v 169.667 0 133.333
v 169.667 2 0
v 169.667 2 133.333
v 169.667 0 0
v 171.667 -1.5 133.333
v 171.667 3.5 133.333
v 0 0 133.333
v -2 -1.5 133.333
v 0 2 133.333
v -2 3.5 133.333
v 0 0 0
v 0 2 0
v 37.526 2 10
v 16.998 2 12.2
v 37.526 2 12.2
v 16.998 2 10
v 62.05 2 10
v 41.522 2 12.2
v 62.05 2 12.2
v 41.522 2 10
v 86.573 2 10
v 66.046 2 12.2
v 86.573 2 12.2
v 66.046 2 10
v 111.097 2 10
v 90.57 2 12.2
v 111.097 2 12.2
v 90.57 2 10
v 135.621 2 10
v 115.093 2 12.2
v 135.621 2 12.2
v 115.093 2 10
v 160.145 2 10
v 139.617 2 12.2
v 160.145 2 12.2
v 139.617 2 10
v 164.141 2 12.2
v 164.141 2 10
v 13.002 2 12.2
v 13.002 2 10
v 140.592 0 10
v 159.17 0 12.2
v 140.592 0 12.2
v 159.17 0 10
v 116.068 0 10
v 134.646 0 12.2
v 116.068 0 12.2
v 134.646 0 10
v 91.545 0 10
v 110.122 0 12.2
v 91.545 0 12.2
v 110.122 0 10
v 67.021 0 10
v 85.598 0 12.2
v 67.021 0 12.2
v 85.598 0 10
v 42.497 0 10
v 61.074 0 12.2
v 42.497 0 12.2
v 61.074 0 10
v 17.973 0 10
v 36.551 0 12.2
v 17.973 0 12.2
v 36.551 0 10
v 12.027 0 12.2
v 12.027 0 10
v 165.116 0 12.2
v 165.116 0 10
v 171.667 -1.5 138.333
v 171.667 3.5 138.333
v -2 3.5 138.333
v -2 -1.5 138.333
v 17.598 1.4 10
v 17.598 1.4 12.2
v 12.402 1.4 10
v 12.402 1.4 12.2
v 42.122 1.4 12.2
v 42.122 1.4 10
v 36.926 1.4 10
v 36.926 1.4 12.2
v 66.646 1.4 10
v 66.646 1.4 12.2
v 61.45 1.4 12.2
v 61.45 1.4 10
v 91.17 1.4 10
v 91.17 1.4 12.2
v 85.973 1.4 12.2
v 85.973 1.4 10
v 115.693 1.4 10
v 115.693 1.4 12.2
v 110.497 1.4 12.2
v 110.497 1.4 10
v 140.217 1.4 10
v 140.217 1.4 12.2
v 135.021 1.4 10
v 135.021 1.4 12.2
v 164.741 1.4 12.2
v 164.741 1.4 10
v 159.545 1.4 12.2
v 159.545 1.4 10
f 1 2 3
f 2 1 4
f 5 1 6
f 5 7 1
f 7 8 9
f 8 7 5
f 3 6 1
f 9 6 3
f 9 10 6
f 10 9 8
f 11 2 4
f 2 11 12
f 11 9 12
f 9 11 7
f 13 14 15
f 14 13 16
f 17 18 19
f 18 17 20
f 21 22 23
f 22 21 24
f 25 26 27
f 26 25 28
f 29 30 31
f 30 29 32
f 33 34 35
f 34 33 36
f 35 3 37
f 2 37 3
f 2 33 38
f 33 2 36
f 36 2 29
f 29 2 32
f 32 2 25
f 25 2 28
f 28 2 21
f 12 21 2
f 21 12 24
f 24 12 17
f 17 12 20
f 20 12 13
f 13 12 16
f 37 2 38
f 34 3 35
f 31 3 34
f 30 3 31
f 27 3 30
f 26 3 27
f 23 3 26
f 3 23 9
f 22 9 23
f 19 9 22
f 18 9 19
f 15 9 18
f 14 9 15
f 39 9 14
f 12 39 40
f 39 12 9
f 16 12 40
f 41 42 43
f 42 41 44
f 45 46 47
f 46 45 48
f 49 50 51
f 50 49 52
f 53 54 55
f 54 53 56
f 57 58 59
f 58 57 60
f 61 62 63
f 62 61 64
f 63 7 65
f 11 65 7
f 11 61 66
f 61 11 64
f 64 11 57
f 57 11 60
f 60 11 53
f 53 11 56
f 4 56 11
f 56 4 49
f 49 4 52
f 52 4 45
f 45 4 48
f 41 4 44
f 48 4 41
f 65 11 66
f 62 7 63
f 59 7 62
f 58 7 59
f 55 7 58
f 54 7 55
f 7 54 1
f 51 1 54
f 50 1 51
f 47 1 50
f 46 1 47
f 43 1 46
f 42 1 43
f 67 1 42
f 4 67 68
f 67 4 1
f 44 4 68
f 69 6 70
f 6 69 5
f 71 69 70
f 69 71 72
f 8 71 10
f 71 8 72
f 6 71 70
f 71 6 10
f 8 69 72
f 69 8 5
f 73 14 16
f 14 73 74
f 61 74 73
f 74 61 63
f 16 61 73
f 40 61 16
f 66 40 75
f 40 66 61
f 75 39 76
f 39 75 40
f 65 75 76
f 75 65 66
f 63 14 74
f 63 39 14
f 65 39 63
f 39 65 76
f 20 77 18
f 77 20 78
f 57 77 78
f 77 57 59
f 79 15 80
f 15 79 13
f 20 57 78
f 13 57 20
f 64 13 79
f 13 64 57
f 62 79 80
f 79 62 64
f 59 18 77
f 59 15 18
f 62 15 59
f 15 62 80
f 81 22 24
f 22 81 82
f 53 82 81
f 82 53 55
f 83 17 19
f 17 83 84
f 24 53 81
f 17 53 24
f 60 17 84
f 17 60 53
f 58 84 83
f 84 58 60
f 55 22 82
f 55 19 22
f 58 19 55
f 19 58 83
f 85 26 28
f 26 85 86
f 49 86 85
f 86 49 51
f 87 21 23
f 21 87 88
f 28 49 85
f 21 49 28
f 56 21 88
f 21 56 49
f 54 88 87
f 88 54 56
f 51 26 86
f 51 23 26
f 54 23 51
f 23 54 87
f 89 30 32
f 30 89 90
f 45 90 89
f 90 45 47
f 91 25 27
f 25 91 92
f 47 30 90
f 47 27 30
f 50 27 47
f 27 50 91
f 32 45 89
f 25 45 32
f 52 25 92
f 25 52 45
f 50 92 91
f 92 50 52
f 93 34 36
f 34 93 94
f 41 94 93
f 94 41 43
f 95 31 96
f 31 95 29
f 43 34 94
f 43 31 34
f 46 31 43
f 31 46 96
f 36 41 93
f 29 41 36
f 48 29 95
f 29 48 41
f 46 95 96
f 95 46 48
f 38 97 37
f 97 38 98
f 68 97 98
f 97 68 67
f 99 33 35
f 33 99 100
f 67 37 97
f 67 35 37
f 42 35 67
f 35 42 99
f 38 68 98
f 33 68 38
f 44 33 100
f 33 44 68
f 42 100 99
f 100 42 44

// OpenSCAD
// file: goodsort-bin-prototype.scad
// ══════════════════════════════════════════════════════════════
// The Good Sort — 1:3 Scale 240L Yellow Bin + Sliding Divider
// ══════════════════════════════════════════════════════════════
// Print at 1:3 scale on Snapmaker U1 (270×270×270mm bed)
// All dimensions in mm (real-world in comments, model = real/3)
//
// Components (print separately):
//   1. bin_shell()        — the yellow bin body
//   2. rail_pair_width()  — 2 rail tracks for the width-axis divider
//   3. rail_pair_depth()  — 2 rail tracks for the depth-axis divider
//   4. divider_width()    — sliding wall (width direction)
//   5. divider_depth()    — sliding wall (depth direction)
//   6. centre_post()      — locking intersection post
//
// To render one part: uncomment it at the bottom of the file

// ── Parameters (real-world mm, divided by scale) ──────────────
scale       = 1/3;

// SULO 240L internal dimensions (real)
real_width  = 560;    // side to side
real_depth  = 640;    // front to back
real_height = 580;    // internal depth
real_taper  = 30;     // each side narrows by this at the bottom

// Model dimensions
w  = real_width  * scale;  // ~187mm
d  = real_depth  * scale;  // ~213mm
h  = real_height * scale;  // ~193mm
tp = real_taper  * scale;  // ~10mm taper per side

// Wall thicknesses
bin_wall    = 2.5;    // bin shell wall
div_thick   = 2.0;    // divider wall thickness
rail_h      = 4.0;    // rail track height
rail_slot   = 2.4;    // slot width in rail (divider slides through)
notch_space = 50 * scale; // ~17mm between notch detents
notch_depth = 0.6;    // how deep the click notch is
notch_width = 2.0;    // notch width along rail

// Divider height (shorter than bin so items can slide out when tipped)
div_height  = 400 * scale; // ~133mm (leaves ~60mm clearance at bottom)

// Centre post
post_size   = 8;      // square cross-section of centre locking post


// ── Modules ───────────────────────────────────────────────────

// Tapered bin shell (open top, no bottom for easy printing)
module bin_shell() {
    difference() {
        // Outer shell — tapered box
        hull() {
            // Top (wider)
            translate([0, 0, h])
                cube([w + bin_wall*2, d + bin_wall*2, 0.01], center=true);
            // Bottom (narrower due to taper)
            translate([0, 0, 0])
                cube([w + bin_wall*2 - tp*2, d + bin_wall*2 - tp*2, 0.01], center=true);
        }
        // Inner cavity
        hull() {
            translate([0, 0, h + 0.1])
                cube([w, d, 0.01], center=true);
            translate([0, 0, bin_wall])
                cube([w - tp*2, d - tp*2, 0.01], center=true);
        }
    }
}

// Rail track — clips to inner bin wall, has a slot for the divider to slide through
module rail_track(length, with_notches=true) {
    difference() {
        // Rail body
        cube([length, rail_h, rail_h]);
        // Slot for divider
        translate([-0.1, (rail_h - rail_slot)/2, rail_h * 0.3])
            cube([length + 0.2, rail_slot, rail_h]);
    }
    // Notch detents inside the slot
    if (with_notches) {
        for (i = [1 : floor(length / notch_space) - 1]) {
            translate([i * notch_space - notch_width/2, (rail_h - rail_slot)/2 - notch_depth, rail_h * 0.3])
                cube([notch_width, notch_depth + 0.1, rail_h * 0.5]);
            translate([i * notch_space - notch_width/2, (rail_h + rail_slot)/2, rail_h * 0.3])
                cube([notch_width, notch_depth + 0.1, rail_h * 0.5]);
        }
    }
}

// Rail pair for width-axis divider (these mount on front + back inner walls)
module rail_pair_width() {
    // Front rail
    rail_track(w - tp*1.5);
    // Back rail (offset for visual clarity when printing)
    translate([0, rail_h + 5, 0])
        rail_track(w - tp*1.5);
}

// Rail pair for depth-axis divider (mount on left + right inner walls)
module rail_pair_depth() {
    rail_track(d - tp*1.5);
    translate([0, rail_h + 5, 0])
        rail_track(d - tp*1.5);
}

// Sliding divider wall (width direction — slides left/right)
module divider_width() {
    // Main wall panel
    cube([d - tp*1.5 - 2, div_thick, div_height]);

    // Top grip/label strip (wider for grabbing + label area)
    translate([-2, -1.5, div_height])
        cube([d - tp*1.5 + 2, div_thick + 3, 5]);

    // Centre slot (cut from top, half height) for interlocking with depth divider
    // This will be done as a difference in the assembly
}

// Sliding divider wall (depth direction — slides front/back)
module divider_depth() {
    cube([w - tp*1.5 - 2, div_thick, div_height]);

    // Top grip/label strip
    translate([-2, -1.5, div_height])
        cube([w - tp*1.5 + 2, div_thick + 3, 5]);
}

// Centre post — locks the two dividers at their intersection
module centre_post() {
    difference() {
        cube([post_size, post_size, div_height * 0.8]);
        // Cross slots for the two divider walls
        translate([-0.1, (post_size - div_thick)/2 - 0.1, -0.1])
            cube([post_size + 0.2, div_thick + 0.2, div_height + 0.2]);
        translate([(post_size - div_thick)/2 - 0.1, -0.1, -0.1])
            cube([div_thick + 0.2, post_size + 0.2, div_height + 0.2]);
    }
}

// ── Drain holes for divider walls ─────────────────────────────
module divider_width_with_drains() {
    difference() {
        divider_width();
        // Drain holes along bottom edge
        for (i = [0 : 8]) {
            translate([15 + i * ((d - tp*1.5) / 9), -0.1, 10])
                cylinder(h = div_thick + 0.2, r = 3, $fn=12);
        }
    }
}

module divider_depth_with_drains() {
    difference() {
        divider_depth();
        for (i = [0 : 6]) {
            translate([15 + i * ((w - tp*1.5) / 7), -0.1, 10])
                cylinder(h = div_thick + 0.2, r = 3, $fn=12);
        }
    }
}


// ── Assembly view (for visualisation, don't print this) ───────
module assembly() {
    color("Gold", 0.3) bin_shell();

    // Width divider (slides left-right) — positioned at centre
    color("Green", 0.8)
        translate([0, -div_thick/2, bin_wall + (h - div_height)/2])
            translate([-((d - tp*1.5 - 2)/2), 0, 0])
                divider_width_with_drains();

    // Depth divider (slides front-back) — positioned at centre
    color("DarkGreen", 0.8)
        translate([-div_thick/2, 0, bin_wall + (h - div_height)/2])
            translate([0, -((w - tp*1.5 - 2)/2), 0])
                rotate([0, 0, 90])
                    divider_depth_with_drains();

    // Centre post
    color("Black")
        translate([-post_size/2, -post_size/2, bin_wall])
            centre_post();

    // Rails (width axis — on front and back walls)
    color("Gray")
        translate([-(w - tp*1.5)/2, d/2 - rail_h, bin_wall + 5])
            rail_track(w - tp*1.5);
    color("Gray")
        translate([-(w - tp*1.5)/2, -d/2, bin_wall + 5])
            rail_track(w - tp*1.5);

    // Rails (depth axis — on left and right walls)
    color("DarkGray")
        translate([w/2 - rail_h, -(d - tp*1.5)/2, bin_wall + 5])
            rotate([0, 0, 90])
                rail_track(d - tp*1.5);
    color("DarkGray")
        translate([-w/2, -(d - tp*1.5)/2, bin_wall + 5])
            rotate([0, 0, 90])
                rail_track(d - tp*1.5);
}


// ══════════════════════════════════════════════════════════════
// UNCOMMENT ONE AT A TIME TO RENDER + EXPORT AS STL:
// ══════════════════════════════════════════════════════════════

// Show full assembly (for preview only — don't print this)
// assembly();

// Individual parts for printing:
// bin_shell();
// rail_pair_width();
// rail_pair_depth();
// divider_width_with_drains();
// divider_depth_with_drains();
// centre_post();
// main file
include <goodsort-bin-prototype.scad>;
divider_depth_with_drains();
